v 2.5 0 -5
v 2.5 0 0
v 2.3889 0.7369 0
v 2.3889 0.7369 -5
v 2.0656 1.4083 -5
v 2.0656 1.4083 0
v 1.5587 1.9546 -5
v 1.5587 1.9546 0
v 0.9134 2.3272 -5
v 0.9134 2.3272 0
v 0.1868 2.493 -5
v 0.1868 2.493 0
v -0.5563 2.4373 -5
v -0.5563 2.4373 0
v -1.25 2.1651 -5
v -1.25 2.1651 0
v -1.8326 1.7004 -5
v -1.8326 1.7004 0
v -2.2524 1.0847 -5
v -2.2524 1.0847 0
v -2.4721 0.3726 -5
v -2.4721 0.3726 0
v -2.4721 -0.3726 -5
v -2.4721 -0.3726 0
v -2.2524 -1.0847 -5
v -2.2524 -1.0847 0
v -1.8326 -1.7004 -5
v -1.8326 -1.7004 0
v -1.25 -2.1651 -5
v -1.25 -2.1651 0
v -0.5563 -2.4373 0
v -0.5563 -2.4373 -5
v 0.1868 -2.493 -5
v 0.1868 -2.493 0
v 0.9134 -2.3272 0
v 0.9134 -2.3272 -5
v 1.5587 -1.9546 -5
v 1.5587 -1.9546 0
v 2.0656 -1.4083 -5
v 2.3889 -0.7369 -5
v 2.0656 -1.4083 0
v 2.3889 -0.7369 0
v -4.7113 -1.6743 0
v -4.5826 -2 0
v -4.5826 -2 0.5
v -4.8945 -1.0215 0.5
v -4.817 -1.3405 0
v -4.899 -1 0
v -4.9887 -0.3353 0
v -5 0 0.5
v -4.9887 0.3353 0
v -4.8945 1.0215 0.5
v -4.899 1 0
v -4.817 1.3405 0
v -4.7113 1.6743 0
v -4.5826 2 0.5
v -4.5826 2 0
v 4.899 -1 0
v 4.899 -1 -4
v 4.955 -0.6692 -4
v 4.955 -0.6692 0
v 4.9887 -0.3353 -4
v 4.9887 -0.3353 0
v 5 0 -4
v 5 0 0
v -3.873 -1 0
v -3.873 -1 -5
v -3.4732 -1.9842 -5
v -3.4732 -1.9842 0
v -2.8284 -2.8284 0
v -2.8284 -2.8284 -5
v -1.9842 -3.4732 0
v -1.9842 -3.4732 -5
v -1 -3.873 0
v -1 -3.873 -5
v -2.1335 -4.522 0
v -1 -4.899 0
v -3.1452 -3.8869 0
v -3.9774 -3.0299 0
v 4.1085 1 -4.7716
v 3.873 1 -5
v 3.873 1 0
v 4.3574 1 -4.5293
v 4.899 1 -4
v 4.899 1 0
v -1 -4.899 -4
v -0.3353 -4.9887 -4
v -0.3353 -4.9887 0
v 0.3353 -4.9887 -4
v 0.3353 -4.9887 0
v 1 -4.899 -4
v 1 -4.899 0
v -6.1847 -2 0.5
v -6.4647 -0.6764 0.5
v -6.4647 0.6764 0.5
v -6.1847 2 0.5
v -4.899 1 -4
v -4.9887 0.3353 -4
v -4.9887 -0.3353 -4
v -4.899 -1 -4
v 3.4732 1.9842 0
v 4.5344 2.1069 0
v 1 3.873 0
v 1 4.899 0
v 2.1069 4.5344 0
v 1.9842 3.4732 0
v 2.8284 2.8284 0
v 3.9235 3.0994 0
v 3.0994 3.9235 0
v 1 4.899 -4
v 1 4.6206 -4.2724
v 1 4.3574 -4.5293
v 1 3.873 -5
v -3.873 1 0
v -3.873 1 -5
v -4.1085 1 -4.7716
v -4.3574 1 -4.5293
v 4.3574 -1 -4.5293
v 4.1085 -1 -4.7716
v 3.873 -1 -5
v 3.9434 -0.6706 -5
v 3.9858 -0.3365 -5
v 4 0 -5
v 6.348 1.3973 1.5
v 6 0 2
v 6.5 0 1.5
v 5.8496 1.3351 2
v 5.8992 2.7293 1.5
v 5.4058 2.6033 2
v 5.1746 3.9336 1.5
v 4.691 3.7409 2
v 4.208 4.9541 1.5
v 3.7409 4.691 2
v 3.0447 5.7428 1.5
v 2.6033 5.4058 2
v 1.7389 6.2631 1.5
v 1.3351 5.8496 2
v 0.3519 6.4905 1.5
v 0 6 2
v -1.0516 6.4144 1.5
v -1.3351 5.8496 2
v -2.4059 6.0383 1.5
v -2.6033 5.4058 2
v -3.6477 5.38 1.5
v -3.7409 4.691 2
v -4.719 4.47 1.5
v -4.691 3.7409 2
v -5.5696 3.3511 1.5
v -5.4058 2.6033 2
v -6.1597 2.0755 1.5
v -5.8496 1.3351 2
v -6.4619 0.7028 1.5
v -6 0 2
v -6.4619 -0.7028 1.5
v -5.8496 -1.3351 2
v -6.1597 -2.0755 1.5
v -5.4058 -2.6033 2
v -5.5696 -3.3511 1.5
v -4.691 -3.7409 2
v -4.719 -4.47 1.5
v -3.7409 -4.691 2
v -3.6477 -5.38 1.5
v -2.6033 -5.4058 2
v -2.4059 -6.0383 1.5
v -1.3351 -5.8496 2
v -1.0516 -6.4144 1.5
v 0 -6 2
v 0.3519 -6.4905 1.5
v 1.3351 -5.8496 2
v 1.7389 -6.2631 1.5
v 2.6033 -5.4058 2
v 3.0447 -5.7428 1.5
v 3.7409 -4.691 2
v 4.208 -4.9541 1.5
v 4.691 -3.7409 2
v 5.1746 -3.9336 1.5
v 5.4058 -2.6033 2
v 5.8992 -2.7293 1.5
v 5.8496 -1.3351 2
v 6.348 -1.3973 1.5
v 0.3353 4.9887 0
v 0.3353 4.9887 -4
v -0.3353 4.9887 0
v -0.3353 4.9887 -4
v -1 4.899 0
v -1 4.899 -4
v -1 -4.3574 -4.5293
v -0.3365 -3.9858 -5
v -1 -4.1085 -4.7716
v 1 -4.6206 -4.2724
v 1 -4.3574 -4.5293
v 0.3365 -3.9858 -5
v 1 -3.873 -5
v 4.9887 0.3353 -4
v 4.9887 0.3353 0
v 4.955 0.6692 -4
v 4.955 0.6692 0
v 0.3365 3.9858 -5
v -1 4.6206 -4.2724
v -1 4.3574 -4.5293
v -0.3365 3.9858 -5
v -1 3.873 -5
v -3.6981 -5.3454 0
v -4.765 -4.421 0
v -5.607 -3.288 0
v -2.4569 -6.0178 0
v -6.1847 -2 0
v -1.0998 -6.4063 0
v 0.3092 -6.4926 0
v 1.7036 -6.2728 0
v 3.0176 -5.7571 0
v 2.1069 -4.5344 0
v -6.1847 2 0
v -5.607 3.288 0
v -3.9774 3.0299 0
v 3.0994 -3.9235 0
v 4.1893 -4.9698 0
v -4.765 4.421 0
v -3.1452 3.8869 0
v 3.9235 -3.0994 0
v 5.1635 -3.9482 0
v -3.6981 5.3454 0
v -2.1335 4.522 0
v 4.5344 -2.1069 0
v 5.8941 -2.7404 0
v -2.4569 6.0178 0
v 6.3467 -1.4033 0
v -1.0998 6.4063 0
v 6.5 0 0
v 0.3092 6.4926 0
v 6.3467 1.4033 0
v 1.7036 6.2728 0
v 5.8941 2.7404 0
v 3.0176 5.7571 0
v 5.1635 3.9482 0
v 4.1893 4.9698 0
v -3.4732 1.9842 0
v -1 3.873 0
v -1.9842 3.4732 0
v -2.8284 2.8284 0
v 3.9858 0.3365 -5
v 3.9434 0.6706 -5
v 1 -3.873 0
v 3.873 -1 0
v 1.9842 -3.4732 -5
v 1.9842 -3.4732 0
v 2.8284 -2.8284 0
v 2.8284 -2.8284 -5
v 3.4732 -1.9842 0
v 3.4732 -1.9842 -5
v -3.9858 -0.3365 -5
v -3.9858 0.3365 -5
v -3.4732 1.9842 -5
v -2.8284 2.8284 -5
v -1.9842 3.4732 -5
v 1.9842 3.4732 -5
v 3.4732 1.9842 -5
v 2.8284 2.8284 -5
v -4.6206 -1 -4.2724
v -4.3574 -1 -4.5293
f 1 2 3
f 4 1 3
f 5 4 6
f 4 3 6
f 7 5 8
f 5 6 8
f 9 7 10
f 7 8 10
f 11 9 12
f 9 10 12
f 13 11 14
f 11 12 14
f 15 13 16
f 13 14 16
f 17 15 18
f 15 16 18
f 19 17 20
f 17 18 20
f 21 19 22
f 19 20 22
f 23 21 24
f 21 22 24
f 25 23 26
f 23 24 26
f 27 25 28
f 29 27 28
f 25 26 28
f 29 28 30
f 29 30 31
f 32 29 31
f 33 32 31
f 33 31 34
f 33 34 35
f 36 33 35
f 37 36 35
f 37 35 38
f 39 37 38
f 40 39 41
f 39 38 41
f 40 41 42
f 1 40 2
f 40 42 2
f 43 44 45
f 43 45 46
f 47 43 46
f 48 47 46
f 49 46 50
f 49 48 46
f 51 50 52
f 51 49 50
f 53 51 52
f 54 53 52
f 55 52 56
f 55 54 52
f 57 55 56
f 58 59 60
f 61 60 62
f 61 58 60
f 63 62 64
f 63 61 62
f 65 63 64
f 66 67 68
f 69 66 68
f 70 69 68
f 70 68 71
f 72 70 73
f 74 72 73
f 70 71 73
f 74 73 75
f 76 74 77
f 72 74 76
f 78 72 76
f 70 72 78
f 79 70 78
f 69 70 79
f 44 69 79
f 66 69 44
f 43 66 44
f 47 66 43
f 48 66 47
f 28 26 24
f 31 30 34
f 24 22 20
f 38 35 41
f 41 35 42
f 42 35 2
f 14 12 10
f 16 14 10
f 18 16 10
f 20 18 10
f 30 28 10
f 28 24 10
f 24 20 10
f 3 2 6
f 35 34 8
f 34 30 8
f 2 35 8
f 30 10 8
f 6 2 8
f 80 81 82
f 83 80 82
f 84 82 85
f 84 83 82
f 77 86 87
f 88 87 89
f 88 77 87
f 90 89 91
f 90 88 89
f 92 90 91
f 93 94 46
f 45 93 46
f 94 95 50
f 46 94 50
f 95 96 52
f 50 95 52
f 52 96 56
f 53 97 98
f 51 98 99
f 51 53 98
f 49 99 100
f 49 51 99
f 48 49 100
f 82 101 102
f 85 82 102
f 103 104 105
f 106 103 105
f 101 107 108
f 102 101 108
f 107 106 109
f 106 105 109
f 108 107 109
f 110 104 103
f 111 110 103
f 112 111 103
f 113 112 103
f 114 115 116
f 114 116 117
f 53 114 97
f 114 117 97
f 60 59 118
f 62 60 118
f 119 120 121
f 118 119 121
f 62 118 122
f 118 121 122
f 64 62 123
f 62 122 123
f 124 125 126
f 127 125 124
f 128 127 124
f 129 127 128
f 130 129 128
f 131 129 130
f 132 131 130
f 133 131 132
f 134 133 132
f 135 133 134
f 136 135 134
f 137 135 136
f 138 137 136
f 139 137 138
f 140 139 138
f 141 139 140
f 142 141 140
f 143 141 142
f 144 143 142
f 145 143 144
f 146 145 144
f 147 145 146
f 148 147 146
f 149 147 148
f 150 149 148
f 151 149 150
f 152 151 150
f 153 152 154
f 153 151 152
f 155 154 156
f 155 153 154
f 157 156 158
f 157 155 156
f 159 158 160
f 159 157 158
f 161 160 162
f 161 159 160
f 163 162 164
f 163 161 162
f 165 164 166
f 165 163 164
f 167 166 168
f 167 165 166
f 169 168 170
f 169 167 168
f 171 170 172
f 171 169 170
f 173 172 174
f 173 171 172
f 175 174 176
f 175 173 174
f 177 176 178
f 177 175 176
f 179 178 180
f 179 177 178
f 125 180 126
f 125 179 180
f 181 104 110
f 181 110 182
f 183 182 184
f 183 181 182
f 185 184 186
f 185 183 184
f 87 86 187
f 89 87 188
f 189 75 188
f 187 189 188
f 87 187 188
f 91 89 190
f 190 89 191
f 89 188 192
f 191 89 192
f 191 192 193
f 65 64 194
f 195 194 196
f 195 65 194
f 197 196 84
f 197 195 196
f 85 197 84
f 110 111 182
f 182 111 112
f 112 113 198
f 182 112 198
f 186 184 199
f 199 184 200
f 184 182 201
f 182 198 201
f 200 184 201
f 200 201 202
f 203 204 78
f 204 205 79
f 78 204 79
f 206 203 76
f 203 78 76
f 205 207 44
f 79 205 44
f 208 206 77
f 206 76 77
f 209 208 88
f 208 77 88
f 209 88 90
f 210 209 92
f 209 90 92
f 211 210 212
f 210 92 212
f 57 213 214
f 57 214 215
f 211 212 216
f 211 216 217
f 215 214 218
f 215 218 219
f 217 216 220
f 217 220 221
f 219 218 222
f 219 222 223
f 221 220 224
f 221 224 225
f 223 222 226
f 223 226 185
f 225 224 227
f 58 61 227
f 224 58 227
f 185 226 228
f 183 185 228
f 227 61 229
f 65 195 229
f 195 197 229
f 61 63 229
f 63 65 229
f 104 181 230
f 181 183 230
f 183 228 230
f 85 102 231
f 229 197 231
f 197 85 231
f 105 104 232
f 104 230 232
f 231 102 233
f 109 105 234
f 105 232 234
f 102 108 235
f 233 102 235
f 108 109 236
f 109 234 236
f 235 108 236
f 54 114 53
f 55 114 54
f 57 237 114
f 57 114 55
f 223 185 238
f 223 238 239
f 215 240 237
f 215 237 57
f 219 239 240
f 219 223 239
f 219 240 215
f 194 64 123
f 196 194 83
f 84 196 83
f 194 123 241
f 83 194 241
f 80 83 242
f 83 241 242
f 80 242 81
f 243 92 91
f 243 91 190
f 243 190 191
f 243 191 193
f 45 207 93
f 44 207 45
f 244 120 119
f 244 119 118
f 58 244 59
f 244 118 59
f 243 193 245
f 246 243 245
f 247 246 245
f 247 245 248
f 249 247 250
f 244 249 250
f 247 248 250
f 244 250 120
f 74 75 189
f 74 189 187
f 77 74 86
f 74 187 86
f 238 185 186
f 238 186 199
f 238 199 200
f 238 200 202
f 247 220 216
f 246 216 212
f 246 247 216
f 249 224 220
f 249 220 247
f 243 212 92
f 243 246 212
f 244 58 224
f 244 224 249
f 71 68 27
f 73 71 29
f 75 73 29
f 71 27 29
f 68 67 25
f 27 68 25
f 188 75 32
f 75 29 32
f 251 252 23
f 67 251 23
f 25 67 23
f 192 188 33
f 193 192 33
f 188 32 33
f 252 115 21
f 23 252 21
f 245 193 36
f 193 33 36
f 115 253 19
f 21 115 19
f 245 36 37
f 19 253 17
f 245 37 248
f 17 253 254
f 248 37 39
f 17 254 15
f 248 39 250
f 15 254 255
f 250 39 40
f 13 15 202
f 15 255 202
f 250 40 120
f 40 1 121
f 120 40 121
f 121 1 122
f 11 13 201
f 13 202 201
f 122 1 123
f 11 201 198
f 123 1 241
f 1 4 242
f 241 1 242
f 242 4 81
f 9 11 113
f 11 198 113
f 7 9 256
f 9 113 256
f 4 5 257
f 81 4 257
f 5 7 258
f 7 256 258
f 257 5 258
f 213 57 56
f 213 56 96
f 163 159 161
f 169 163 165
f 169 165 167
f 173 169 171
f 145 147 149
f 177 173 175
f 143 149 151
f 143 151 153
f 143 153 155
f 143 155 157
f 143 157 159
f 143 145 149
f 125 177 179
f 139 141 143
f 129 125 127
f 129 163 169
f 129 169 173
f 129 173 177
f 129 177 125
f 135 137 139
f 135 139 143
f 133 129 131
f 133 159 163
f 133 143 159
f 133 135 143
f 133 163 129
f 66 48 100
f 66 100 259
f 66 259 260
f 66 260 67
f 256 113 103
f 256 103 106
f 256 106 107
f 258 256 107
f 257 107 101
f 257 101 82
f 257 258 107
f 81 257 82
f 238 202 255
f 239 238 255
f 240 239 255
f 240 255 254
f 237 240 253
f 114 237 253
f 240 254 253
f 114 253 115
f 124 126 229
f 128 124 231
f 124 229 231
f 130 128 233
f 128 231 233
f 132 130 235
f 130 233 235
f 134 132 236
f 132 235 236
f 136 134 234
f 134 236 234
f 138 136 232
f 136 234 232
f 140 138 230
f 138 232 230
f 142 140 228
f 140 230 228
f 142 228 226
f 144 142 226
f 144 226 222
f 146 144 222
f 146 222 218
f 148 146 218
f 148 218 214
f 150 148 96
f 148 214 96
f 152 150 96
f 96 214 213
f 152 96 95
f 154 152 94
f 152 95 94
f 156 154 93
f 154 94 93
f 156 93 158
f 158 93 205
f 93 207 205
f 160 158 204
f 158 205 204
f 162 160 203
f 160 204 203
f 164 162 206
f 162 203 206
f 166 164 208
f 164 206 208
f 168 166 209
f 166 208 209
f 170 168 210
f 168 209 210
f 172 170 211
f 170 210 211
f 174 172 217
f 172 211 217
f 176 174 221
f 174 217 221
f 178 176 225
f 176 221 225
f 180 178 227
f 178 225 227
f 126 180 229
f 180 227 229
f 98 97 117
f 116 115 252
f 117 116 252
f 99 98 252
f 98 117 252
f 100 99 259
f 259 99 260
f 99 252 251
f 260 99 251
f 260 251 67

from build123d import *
from build123d.topology import SkipClean

# Parameters (mm, degrees)
SKETCH1_R           = 5
SKETCH1_R_2         = 2.5
BOSS_EXTRUDE1_DEPTH = 5
SKETCH2_R           = 6.5
BOSS_EXTRUDE2_DEPTH = 2
CHAMFER1_SIZE       = 0.5
CUT_EXTRUDE1_DEPTH  = 0.5
CUT_EXTRUDE2_DEPTH  = 5


with BuildPart() as part:
    # Sketch1 → Boss-Extrude1 (new body)
    with BuildSketch(Plane.XY):
        Circle(SKETCH1_R)
        Circle(SKETCH1_R_2, mode=Mode.SUBTRACT)
    extrude(amount=-BOSS_EXTRUDE1_DEPTH)

    # Sketch2 → Boss-Extrude2 (add)
    with BuildSketch(Plane.XY):
        Circle(SKETCH2_R)
    extrude(amount=BOSS_EXTRUDE2_DEPTH)

    # Chamfer1
    chamfer1_edges = [part.edges().sort_by_distance(p)[0] for p in [
        (-6.5, 0, 2),
    ]]
    chamfer(chamfer1_edges, length=CHAMFER1_SIZE)

    # Sketch3 → Cut-Extrude1 (cut)
    with SkipClean():  # the faces are left unmerged after this step: merging them gives an invalid solid
        with BuildSketch(Plane(origin=(0, 0, 0), x_dir=(-1, 0, 0), z_dir=(0, 0, -1))):
            with BuildLine():
                Line((4.582575695, 2), (6.184658438, 2))
                ThreePointArc((6.184658438, 2), (6.5, 0), (6.184658438, -2))
                Line((6.184658438, -2), (4.582575695, -2))
                ThreePointArc((4.582575695, -2), (5, 0), (4.582575695, 2))
            make_face()
        extrude(amount=-CUT_EXTRUDE1_DEPTH, mode=Mode.SUBTRACT)

    # Sketch4 → Cut-Extrude2 (cut)
    with SkipClean():  # the faces are left unmerged after this step: merging them gives an invalid solid
        with BuildSketch(Plane(origin=(0, 0, -5), x_dir=(-1, 0, 0), z_dir=(0, 0, -1))):
            with BuildLine():
                Line((-1, 4.898979486), (-1, 3.872983346))
                ThreePointArc((-1, 3.872983346), (-2.828427125, 2.828427125), (-3.872983346, 1))
                Line((-3.872983346, 1), (-4.898979486, 1))
                ThreePointArc((-4.898979486, 1), (-3.535533906, 3.535533906), (-1, 4.898979486))
            make_face()
            with BuildLine():
                Line((1, 4.898979486), (1, 3.872983346))
                ThreePointArc((1, 3.872983346), (2.828427125, 2.828427125), (3.872983346, 1))
                Line((3.872983346, 1), (4.898979486, 1))
                ThreePointArc((4.898979486, 1), (3.535533906, 3.535533906), (1, 4.898979486))
            make_face()
            with BuildLine():
                Line((4.898979486, -1), (3.872983346, -1))
                ThreePointArc((3.872983346, -1), (2.828427125, -2.828427125), (1, -3.872983346))
                Line((1, -3.872983346), (1, -4.898979486))
                ThreePointArc((1, -4.898979486), (3.535533906, -3.535533906), (4.898979486, -1))
            make_face()
            with BuildLine():
                Line((-3.872983346, -1), (-4.898979486, -1))
                ThreePointArc((-4.898979486, -1), (-3.535533906, -3.535533906), (-1, -4.898979486))
                Line((-1, -4.898979486), (-1, -3.872983346))
                ThreePointArc((-1, -3.872983346), (-2.828427125, -2.828427125), (-3.872983346, -1))
            make_face()
        extrude(amount=-CUT_EXTRUDE2_DEPTH, mode=Mode.SUBTRACT)

    # Chamfer2: read off the stored shape, not the designer's step
    # Chamfer2 outline → Chamfer2 (revolve, cut)
    with SkipClean():  # the faces are left unmerged after this step: merging them gives an invalid solid
        with BuildSketch(Plane.XZ):
            Polygon((5, -4), (4, -5), (5, -5), align=None)
        revolve(axis=Axis((0, 0, 0), (0, 0, 1)), mode=Mode.SUBTRACT)


solid = part.part
